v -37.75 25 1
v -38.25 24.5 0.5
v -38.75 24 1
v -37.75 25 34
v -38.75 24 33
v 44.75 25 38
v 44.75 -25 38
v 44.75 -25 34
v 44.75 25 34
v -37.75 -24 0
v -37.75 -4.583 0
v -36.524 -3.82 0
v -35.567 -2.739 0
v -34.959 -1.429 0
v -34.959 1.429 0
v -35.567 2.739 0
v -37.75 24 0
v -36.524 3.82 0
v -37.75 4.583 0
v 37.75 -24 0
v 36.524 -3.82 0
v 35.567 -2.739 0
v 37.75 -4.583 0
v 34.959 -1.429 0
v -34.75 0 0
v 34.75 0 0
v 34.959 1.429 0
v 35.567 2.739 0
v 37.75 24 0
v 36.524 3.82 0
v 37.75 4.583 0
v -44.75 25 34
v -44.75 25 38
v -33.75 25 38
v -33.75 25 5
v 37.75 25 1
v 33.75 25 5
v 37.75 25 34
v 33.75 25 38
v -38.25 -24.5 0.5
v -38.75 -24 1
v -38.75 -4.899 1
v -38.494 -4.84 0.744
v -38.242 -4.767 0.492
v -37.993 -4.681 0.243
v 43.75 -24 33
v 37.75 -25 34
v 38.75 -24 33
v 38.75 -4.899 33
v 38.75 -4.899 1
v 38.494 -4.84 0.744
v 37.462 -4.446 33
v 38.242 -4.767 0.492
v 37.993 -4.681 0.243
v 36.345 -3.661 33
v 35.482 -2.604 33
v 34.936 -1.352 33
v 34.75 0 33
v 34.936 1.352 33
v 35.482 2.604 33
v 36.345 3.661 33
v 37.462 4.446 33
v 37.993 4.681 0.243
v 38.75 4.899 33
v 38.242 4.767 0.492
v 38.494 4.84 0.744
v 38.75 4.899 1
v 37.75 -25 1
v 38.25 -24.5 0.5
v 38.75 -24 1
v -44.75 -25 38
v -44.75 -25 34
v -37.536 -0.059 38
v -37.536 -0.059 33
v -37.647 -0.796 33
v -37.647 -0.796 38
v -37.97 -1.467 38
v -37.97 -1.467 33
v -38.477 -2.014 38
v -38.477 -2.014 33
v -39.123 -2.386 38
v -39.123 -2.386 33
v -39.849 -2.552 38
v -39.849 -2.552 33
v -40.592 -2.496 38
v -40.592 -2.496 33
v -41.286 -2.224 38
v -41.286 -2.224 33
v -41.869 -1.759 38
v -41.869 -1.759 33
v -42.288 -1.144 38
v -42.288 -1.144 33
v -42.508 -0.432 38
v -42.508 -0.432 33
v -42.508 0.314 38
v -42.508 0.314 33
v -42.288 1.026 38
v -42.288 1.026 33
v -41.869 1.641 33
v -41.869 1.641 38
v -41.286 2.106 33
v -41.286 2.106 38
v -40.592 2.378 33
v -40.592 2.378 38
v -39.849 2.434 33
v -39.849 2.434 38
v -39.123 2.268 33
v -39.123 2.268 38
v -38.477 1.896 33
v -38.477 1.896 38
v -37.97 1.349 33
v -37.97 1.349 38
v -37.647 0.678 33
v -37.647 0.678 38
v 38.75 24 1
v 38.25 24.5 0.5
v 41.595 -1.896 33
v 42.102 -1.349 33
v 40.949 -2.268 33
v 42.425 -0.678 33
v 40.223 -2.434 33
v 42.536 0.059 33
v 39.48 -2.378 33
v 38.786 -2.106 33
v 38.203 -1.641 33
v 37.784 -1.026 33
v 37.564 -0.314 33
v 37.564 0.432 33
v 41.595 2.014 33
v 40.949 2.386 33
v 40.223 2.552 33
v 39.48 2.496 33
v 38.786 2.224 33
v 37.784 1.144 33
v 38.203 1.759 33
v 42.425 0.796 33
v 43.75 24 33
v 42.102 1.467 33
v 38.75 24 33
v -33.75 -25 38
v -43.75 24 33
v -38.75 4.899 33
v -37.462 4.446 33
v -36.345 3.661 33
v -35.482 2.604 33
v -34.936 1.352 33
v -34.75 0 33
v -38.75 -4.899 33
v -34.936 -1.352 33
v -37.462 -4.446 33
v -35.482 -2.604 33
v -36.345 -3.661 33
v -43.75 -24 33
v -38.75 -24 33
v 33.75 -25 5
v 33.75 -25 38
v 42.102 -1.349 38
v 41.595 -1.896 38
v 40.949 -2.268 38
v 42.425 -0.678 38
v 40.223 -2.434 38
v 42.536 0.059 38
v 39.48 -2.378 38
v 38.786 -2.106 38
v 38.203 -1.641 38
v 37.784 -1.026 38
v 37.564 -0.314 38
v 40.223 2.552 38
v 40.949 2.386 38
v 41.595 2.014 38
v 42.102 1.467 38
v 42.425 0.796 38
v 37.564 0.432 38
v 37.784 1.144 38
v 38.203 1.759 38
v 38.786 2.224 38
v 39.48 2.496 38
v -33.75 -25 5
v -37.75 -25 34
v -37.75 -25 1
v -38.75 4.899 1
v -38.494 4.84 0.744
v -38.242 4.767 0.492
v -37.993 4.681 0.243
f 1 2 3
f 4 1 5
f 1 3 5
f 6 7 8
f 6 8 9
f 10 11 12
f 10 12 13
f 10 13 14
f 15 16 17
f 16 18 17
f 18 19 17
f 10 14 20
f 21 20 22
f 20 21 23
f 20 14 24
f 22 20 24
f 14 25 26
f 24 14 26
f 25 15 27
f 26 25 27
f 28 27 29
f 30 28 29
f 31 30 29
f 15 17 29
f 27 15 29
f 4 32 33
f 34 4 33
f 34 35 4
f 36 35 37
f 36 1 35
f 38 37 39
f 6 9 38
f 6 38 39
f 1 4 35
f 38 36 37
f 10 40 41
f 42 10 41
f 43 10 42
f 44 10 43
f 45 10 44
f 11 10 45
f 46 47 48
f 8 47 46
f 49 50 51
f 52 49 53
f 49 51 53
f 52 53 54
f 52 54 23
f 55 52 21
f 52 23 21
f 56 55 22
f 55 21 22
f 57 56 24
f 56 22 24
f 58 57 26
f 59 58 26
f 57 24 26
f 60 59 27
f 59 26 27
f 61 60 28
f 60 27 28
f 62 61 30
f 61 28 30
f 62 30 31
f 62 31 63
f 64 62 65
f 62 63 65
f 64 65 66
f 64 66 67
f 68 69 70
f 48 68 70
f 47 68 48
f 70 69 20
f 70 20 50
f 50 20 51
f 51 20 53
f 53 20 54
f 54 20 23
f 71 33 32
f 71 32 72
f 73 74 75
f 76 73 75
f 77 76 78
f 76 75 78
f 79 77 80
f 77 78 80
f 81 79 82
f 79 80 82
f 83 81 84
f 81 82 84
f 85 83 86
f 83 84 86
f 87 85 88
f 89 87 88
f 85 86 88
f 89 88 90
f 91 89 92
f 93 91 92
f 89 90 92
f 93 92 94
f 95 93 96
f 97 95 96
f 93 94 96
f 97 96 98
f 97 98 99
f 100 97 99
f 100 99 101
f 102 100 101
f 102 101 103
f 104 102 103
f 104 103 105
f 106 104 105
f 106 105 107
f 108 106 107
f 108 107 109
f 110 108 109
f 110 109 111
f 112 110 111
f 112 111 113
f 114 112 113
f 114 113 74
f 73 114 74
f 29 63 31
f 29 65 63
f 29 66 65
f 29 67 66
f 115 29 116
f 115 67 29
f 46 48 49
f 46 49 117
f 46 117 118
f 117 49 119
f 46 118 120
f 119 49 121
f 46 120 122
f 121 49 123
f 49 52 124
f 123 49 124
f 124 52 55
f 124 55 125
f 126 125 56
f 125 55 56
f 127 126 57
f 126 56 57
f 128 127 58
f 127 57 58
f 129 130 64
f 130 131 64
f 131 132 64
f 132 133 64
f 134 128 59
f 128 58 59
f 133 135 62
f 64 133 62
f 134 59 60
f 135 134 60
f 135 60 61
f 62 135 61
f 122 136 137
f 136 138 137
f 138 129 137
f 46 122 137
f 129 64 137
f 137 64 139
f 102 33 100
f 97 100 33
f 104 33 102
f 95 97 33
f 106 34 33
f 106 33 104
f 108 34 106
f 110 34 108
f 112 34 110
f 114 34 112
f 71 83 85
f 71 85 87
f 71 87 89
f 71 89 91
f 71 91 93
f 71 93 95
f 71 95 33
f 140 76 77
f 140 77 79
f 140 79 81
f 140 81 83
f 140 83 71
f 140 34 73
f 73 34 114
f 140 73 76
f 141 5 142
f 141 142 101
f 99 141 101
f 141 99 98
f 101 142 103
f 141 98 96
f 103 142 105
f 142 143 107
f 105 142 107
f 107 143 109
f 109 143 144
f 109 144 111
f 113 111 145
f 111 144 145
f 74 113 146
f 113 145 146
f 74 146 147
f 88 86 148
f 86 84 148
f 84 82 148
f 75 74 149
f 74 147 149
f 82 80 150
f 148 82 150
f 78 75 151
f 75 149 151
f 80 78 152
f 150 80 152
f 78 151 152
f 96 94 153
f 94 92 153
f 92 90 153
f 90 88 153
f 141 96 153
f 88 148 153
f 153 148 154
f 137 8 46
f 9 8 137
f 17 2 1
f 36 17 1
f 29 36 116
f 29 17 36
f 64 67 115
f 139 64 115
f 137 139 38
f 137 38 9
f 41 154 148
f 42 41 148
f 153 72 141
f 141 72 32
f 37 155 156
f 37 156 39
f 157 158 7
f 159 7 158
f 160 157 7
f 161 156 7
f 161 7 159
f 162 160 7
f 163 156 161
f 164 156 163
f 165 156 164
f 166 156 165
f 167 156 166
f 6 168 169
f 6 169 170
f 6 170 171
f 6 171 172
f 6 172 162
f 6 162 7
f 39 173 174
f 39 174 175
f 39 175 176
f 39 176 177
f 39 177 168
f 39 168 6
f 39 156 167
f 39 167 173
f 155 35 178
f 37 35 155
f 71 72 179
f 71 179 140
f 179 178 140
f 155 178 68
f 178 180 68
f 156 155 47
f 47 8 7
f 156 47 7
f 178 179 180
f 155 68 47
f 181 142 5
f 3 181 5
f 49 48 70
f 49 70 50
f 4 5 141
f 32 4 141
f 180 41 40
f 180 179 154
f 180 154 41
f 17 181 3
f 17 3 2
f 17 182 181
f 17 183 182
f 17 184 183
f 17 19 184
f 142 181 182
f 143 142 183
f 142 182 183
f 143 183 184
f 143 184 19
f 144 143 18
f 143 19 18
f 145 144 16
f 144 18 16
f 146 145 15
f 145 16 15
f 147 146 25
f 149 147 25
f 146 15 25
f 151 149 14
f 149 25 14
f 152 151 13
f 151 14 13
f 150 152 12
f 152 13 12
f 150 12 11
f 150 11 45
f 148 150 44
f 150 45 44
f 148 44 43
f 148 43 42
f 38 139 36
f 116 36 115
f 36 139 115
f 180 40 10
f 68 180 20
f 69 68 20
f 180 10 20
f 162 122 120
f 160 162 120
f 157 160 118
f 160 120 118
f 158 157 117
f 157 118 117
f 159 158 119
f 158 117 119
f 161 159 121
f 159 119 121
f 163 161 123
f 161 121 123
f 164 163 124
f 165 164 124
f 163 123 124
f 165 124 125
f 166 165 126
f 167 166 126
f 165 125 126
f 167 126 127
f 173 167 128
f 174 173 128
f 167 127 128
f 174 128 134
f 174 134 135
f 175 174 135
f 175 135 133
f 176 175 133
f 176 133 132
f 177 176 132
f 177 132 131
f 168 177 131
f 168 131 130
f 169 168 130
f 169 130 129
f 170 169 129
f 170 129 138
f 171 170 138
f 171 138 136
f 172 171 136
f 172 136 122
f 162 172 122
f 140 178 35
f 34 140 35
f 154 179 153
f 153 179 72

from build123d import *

# Parameters (mm, degrees)
SKETCH_W        = 77.5
SKETCH_H        = 50
PAD_DEPTH       = 5
SKETCH001_W     = 5
SKETCH001_H     = 50
PAD001_DEPTH    = 33
SKETCH002_W     = 50
SKETCH002_H     = 5
PAD002_DEPTH    = 6
SKETCH003_W     = 50
SKETCH003_H     = 5
PAD003_DEPTH    = 6
SKETCH004_R     = 2.5
POCKET_DEPTH    = 5.001
SKETCH005_R     = 5
POCKET001_DEPTH = 33
CHAMFER_SIZE    = 1
CHAMFER001_SIZE = 1
CHAMFER002_SIZE = 1


with BuildPart() as part:
    # Sketch → Pad (new body)
    with BuildSketch(Plane.XY):
        Rectangle(SKETCH_W, SKETCH_H)
    extrude(amount=PAD_DEPTH)

    # Sketch001 (on Face6 of Pad) → Pad001 (join)
    with BuildSketch(Plane.XY.offset(5)):
        with Locations((-36.25, 0)):
            Rectangle(SKETCH001_W, SKETCH001_H)
        with Locations((36.25, 0)):
            Rectangle(SKETCH001_W, SKETCH001_H)
    extrude(amount=PAD001_DEPTH)

    # Sketch002 (on Face10 of Pad001) → Pad002 (join)
    with BuildSketch(Plane.YZ.offset(38.75)):
        with Locations((0, 35.5)):
            Rectangle(SKETCH002_W, SKETCH002_H)
    extrude(amount=PAD002_DEPTH)

    # Sketch003 (on Face9 of Pad002) → Pad003 (join)
    with BuildSketch(Plane(origin=(-38.75, 0, 0), x_dir=(0, -1, 0), z_dir=(-1, 0, 0))):
        with Locations((0, 35.5)):
            Rectangle(SKETCH003_W, SKETCH003_H)
    extrude(amount=PAD003_DEPTH)

    # Sketch004 (on Face19 of Pad003) → Pocket (cut, through all)
    with BuildSketch(Plane(origin=(0, 0, 33), x_dir=(1, 0, 0), z_dir=(0, 0, -1))):
        with Locations((40.036056, -0.059049)):
            Circle(SKETCH004_R)
        with Locations((-40.036056, 0.059049)):
            Circle(SKETCH004_R)
    extrude(amount=-POCKET_DEPTH, mode=Mode.SUBTRACT)

    # Sketch005 (on Face4 of Pocket) → Pocket001 (cut)
    with BuildSketch(Plane(origin=(0, 0, 0), x_dir=(1, 0, 0), z_dir=(0, 0, -1))):
        with Locations((39.75, 0)):
            Circle(SKETCH005_R)
        with Locations((-39.75, 0)):
            Circle(SKETCH005_R)
    extrude(amount=-POCKET001_DEPTH, mode=Mode.SUBTRACT)

    # Chamfer
    chamfer_edges = [part.edges().sort_by_distance(p)[0] for p in [
        (0, 25, 0),
        (0, -25, 0),
        (-38.75, 14.94949, 0),
        (-38.75, -14.94949, 0),
        (38.75, -14.94949, 0),
        (38.75, 14.94949, 0),
    ]]
    chamfer(chamfer_edges, length=CHAMFER_SIZE)

    # Chamfer001
    chamfer001_edges = [part.edges().sort_by_distance(p)[0] for p in [
        (-44.75, 12.5, 33),
        (-44.75, -12.5, 33),
        (44.75, -12.5, 33),
        (44.75, 12.5, 33),
        (-41.75, -25, 33),
        (-41.75, 25, 33),
        (41.75, 25, 33),
        (41.75, -25, 33),
    ]]
    chamfer(chamfer001_edges, length=CHAMFER001_SIZE)

    # Chamfer002
    chamfer002_edges = [part.edges().sort_by_distance(p)[0] for p in [
        (-38.75, 25, 19),
        (-38.75, -25, 19),
        (38.75, 25, 19),
        (38.75, -25, 19),
    ]]
    chamfer(chamfer002_edges, length=CHAMFER002_SIZE)


solid = part.part
